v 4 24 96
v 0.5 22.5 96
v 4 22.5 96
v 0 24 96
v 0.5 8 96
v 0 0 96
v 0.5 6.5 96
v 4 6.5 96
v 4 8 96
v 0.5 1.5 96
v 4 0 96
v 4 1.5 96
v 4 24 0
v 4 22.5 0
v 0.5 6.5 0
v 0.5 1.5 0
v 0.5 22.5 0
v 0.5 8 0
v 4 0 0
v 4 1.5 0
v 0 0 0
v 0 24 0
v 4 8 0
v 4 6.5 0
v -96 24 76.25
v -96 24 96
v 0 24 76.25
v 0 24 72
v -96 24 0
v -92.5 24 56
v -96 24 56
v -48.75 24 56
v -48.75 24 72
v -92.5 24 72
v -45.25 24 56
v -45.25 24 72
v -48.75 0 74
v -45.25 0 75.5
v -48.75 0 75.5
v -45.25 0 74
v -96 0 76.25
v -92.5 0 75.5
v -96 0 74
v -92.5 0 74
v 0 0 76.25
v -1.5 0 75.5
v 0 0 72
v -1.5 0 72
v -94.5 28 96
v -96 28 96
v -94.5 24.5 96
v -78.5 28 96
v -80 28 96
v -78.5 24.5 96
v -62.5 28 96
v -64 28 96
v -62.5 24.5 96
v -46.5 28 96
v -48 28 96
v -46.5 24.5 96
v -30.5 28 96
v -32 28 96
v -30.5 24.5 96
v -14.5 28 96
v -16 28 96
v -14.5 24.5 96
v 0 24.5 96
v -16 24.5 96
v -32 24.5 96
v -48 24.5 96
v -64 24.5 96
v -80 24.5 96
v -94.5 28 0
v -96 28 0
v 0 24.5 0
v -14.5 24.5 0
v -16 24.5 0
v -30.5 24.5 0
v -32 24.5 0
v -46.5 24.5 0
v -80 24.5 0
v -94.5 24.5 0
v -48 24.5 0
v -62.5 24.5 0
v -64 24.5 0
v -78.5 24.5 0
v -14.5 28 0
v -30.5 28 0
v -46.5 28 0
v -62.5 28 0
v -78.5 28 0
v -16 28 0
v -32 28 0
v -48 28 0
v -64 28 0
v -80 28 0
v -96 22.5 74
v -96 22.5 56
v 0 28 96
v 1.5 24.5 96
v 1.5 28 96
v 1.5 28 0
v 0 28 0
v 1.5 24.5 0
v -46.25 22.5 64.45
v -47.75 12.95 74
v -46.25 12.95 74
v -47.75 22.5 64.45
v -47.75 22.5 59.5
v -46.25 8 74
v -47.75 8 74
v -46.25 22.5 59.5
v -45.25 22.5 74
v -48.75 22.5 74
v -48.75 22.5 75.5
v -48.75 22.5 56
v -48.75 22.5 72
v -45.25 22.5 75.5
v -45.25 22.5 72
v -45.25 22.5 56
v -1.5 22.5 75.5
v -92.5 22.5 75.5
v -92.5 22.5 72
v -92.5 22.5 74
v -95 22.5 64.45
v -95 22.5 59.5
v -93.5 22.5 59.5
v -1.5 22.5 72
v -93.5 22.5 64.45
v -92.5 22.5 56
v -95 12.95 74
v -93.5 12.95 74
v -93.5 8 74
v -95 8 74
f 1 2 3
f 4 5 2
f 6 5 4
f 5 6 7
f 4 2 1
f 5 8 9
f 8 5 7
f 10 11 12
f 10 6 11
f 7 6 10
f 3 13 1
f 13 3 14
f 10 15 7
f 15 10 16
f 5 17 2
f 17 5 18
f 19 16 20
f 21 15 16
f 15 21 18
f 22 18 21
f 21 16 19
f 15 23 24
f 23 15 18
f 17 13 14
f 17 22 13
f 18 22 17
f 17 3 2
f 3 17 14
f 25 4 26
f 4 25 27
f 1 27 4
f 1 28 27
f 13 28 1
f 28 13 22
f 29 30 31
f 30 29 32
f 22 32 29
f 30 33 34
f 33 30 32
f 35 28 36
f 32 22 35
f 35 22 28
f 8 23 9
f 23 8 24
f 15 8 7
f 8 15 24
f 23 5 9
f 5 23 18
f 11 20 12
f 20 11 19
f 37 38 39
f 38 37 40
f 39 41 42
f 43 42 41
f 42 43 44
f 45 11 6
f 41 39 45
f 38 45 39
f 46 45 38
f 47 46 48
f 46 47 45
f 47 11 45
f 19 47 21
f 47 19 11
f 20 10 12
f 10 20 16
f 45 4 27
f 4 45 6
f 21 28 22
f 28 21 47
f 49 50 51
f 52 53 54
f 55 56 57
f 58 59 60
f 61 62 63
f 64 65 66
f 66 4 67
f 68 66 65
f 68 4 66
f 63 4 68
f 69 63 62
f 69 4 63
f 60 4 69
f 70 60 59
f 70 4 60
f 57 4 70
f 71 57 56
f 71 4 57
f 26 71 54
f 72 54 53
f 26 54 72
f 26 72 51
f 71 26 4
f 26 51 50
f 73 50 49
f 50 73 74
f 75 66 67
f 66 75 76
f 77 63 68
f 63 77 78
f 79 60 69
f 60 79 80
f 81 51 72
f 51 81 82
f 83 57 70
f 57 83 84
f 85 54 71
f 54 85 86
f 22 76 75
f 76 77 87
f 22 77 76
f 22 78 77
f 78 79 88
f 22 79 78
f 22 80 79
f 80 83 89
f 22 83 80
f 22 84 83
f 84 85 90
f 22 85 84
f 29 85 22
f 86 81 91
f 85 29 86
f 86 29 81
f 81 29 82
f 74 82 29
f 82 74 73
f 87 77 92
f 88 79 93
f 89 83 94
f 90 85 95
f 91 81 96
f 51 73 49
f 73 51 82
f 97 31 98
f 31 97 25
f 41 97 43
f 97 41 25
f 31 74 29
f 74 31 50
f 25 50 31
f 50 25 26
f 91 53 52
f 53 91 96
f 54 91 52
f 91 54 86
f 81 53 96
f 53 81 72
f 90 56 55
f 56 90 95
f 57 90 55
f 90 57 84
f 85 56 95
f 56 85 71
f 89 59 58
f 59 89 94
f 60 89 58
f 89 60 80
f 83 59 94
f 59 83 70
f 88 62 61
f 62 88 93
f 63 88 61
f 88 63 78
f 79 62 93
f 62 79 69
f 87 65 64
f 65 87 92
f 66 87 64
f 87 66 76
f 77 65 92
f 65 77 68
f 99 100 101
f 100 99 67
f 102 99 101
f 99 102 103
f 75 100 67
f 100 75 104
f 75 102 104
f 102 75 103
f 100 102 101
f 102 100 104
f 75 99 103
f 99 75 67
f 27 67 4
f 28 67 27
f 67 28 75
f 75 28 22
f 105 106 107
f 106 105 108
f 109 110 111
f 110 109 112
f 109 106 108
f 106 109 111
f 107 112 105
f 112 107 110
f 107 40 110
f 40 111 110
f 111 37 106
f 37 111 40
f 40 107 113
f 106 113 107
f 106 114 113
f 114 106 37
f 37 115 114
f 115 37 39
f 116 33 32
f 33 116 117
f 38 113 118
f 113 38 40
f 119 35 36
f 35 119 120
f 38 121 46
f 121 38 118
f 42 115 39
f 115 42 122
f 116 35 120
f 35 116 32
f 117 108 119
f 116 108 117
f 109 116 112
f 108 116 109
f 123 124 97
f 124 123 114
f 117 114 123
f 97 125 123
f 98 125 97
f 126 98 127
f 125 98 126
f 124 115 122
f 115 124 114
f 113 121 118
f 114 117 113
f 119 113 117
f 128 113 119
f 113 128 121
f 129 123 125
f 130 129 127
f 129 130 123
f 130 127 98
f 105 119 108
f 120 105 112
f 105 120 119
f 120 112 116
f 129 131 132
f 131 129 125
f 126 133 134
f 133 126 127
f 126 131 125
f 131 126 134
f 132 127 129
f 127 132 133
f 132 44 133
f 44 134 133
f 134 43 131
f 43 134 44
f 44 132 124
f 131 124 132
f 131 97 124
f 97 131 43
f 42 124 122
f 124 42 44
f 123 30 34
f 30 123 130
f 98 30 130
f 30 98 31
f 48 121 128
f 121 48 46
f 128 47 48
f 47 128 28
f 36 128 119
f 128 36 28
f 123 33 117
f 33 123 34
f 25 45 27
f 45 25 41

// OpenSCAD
// file: lBracket.scad
twoByFourWidth = 1.5;
twoByFourHeight = 3.5;

module twoByFour(length)
{
  cube([ length, twoByFourWidth, twoByFourHeight ]);
}

module lBracket(x = 0, y = 0, z = 0)
{
  x = x - 0.25;
  depth = 24;
  height = 18;

  // Top plate
  translate([ -twoByFourHeight / 2 + x, 0 + y, 0 + z ]) rotate([ 90, 0, 90 ]) twoByFour(depth);

  // Wall Plate
  translate([ -twoByFourHeight / 2 + x, 0 + y, 0 + z ]) rotate([ 0, 90, 0 ]) twoByFour(height);

  // Diagonal thing
  diaganalLength_x = depth * 2 / 3;
  diaganalLength_y = depth * 2 / 3;

  diaganalLength = norm([ diaganalLength_y, diaganalLength_x ]);  // radial distance
  b = acos(diaganalLength_x / diaganalLength);                    // inclination angle
  c = atan2(diaganalLength_y, 0);                                 // azimuthal angle

  difference()
  {
    translate([ twoByFourWidth / 2 + x, 0 + y, -diaganalLength_y + z ]) rotate([ 0, -b, 90 ])
        twoByFour(diaganalLength);

    translate([ -twoByFourWidth + x, 0 + y, 0 + z ]) cube([ 2 * twoByFourWidth, 2 * diaganalLength_x, 2 * twoByFourHeight ]);
    translate([ -twoByFourWidth + x, -2 * twoByFourHeight + y, -2 * diaganalLength_y + z ]) cube([ 2 * twoByFourWidth, 2 * twoByFourHeight, 2 * diaganalLength_y ]);
  }
}
// main file
include<lBracket.scad>;

sideWallLength = 24;
backWallFullLength = 96;

enableDrywall = 1;

module shelfUnit()
{
  backWallLength = backWallFullLength / 2 - twoByFourWidth + twoByFourWidth / 2;

  // Side wall
  rotate([ 0, 0, 90 ]) twoByFour(sideWallLength);

  // Back Wall 1
  translate([ -twoByFourWidth, sideWallLength, 0 ])
      rotate([ 0, 0, 180 ])
          twoByFour(backWallLength - twoByFourHeight);

  // Back Wall 2
  translate([ -twoByFourWidth - backWallLength, sideWallLength, 0 ])
      rotate([ 0, 0, 180 ])
          twoByFour(backWallLength - twoByFourHeight);

  // Middle bracket
  translate([ -backWallLength, sideWallLength, twoByFourHeight - twoByFourWidth ])
      rotate([ 0, 0, 180 ])
          lBracket();

  // End bracket
  translate([ -backWallLength - backWallLength, sideWallLength, twoByFourHeight - twoByFourWidth ])
      rotate([ 0, 0, 180 ])
          lBracket();

  // Shelf plate
  translate([ -12 * 8, 0, twoByFourHeight ]) cube([ 12 * 8, sideWallLength, 3 / 4 ]);
}

module wall(length, height = 8 * 12)
{
  studCenters = 16;
  drywallThickness = 1 / 2;
  for (x = [0:studCenters:length])
  {
    translate([ x, drywallThickness, 0 ])
        rotate([ 0, -90, -90 ])
            twoByFour(height);
  }

  // Landed on an un even stud center
  if (length % studCenters != 0)
  {
    translate([ length - twoByFourWidth, drywallThickness, 0 ])
        rotate([ 0, -90, -90 ])
            twoByFour(height);
  }

  // Drywall
  if (enableDrywall)
    cube([ length, drywallThickness, height ]);
}

// Side wall
translate([ 0, sideWallLength, 0 ]) rotate([ 0, 0, -90 ]) wall(sideWallLength);

// Back wall
translate([ -backWallFullLength, sideWallLength, 0 ]) rotate([ 0, 0, 0 ]) wall(backWallFullLength);

// Shelving
translate([ 0, 0, 72 ]) 
  shelfUnit();
